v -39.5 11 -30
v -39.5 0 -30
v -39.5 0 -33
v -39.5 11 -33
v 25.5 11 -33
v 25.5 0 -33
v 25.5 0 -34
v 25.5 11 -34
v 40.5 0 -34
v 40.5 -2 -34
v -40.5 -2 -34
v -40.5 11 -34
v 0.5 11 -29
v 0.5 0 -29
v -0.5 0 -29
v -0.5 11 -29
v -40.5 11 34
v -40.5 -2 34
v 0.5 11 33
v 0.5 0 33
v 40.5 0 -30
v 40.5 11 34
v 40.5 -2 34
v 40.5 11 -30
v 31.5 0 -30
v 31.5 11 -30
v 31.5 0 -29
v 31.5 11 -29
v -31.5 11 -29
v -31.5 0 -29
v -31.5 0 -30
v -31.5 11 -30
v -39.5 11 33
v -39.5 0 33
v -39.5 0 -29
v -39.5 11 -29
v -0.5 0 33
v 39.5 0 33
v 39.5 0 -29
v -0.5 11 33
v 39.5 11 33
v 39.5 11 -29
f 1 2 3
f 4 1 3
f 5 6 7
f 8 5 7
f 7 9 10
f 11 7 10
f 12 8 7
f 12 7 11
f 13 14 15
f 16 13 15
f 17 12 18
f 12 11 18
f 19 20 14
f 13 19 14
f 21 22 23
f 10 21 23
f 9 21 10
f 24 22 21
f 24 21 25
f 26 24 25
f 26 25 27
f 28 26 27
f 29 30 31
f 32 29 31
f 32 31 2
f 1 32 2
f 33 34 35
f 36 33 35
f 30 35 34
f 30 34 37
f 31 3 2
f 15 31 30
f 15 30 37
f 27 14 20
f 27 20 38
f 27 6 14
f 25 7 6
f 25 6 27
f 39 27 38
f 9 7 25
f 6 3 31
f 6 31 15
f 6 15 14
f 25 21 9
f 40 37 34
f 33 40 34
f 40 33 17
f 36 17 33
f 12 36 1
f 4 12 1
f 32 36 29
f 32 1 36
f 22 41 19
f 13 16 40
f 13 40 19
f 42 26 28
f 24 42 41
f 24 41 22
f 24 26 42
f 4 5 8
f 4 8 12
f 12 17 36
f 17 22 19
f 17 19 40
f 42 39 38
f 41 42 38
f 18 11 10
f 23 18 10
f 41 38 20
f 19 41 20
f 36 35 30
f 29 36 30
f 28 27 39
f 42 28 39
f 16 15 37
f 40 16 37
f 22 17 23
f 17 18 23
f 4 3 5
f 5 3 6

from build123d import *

# Parameters (mm, degrees)
SKETCH1_W           = 81
SKETCH1_H           = 68
BOSS_EXTRUDE1_DEPTH = 2
BOSS_EXTRUDE2_DEPTH = 11


with BuildPart() as part:
    # Sketch1 → Boss-Extrude1 (new body)
    with BuildSketch(Plane(origin=(0, 0, 0), x_dir=(1, 0, 0), z_dir=(0, 1, 0))):
        Rectangle(SKETCH1_W, SKETCH1_H)
    extrude(amount=-BOSS_EXTRUDE1_DEPTH)

    # Sketch1<3> → Boss-Extrude2 (add)
    with BuildSketch(Plane(origin=(0, 0, 0), x_dir=(1, 0, 0), z_dir=(0, 1, 0))):
        Polygon((0.5, 29), (-0.5, 29), (-0.5, -33), (-39.5, -33), (-39.5, 29), (-31.5, 29), (-31.5, 30), (-39.5, 30), (-39.5, 33), (25.5, 33), (25.5, 34), (-40.5, 34), (-40.5, -34), (40.5, -34), (40.5, 30), (31.5, 30), (31.5, 29), (39.5, 29), (39.5, -33), (0.5, -33), align=None)
    extrude(amount=BOSS_EXTRUDE2_DEPTH)


solid = part.part
